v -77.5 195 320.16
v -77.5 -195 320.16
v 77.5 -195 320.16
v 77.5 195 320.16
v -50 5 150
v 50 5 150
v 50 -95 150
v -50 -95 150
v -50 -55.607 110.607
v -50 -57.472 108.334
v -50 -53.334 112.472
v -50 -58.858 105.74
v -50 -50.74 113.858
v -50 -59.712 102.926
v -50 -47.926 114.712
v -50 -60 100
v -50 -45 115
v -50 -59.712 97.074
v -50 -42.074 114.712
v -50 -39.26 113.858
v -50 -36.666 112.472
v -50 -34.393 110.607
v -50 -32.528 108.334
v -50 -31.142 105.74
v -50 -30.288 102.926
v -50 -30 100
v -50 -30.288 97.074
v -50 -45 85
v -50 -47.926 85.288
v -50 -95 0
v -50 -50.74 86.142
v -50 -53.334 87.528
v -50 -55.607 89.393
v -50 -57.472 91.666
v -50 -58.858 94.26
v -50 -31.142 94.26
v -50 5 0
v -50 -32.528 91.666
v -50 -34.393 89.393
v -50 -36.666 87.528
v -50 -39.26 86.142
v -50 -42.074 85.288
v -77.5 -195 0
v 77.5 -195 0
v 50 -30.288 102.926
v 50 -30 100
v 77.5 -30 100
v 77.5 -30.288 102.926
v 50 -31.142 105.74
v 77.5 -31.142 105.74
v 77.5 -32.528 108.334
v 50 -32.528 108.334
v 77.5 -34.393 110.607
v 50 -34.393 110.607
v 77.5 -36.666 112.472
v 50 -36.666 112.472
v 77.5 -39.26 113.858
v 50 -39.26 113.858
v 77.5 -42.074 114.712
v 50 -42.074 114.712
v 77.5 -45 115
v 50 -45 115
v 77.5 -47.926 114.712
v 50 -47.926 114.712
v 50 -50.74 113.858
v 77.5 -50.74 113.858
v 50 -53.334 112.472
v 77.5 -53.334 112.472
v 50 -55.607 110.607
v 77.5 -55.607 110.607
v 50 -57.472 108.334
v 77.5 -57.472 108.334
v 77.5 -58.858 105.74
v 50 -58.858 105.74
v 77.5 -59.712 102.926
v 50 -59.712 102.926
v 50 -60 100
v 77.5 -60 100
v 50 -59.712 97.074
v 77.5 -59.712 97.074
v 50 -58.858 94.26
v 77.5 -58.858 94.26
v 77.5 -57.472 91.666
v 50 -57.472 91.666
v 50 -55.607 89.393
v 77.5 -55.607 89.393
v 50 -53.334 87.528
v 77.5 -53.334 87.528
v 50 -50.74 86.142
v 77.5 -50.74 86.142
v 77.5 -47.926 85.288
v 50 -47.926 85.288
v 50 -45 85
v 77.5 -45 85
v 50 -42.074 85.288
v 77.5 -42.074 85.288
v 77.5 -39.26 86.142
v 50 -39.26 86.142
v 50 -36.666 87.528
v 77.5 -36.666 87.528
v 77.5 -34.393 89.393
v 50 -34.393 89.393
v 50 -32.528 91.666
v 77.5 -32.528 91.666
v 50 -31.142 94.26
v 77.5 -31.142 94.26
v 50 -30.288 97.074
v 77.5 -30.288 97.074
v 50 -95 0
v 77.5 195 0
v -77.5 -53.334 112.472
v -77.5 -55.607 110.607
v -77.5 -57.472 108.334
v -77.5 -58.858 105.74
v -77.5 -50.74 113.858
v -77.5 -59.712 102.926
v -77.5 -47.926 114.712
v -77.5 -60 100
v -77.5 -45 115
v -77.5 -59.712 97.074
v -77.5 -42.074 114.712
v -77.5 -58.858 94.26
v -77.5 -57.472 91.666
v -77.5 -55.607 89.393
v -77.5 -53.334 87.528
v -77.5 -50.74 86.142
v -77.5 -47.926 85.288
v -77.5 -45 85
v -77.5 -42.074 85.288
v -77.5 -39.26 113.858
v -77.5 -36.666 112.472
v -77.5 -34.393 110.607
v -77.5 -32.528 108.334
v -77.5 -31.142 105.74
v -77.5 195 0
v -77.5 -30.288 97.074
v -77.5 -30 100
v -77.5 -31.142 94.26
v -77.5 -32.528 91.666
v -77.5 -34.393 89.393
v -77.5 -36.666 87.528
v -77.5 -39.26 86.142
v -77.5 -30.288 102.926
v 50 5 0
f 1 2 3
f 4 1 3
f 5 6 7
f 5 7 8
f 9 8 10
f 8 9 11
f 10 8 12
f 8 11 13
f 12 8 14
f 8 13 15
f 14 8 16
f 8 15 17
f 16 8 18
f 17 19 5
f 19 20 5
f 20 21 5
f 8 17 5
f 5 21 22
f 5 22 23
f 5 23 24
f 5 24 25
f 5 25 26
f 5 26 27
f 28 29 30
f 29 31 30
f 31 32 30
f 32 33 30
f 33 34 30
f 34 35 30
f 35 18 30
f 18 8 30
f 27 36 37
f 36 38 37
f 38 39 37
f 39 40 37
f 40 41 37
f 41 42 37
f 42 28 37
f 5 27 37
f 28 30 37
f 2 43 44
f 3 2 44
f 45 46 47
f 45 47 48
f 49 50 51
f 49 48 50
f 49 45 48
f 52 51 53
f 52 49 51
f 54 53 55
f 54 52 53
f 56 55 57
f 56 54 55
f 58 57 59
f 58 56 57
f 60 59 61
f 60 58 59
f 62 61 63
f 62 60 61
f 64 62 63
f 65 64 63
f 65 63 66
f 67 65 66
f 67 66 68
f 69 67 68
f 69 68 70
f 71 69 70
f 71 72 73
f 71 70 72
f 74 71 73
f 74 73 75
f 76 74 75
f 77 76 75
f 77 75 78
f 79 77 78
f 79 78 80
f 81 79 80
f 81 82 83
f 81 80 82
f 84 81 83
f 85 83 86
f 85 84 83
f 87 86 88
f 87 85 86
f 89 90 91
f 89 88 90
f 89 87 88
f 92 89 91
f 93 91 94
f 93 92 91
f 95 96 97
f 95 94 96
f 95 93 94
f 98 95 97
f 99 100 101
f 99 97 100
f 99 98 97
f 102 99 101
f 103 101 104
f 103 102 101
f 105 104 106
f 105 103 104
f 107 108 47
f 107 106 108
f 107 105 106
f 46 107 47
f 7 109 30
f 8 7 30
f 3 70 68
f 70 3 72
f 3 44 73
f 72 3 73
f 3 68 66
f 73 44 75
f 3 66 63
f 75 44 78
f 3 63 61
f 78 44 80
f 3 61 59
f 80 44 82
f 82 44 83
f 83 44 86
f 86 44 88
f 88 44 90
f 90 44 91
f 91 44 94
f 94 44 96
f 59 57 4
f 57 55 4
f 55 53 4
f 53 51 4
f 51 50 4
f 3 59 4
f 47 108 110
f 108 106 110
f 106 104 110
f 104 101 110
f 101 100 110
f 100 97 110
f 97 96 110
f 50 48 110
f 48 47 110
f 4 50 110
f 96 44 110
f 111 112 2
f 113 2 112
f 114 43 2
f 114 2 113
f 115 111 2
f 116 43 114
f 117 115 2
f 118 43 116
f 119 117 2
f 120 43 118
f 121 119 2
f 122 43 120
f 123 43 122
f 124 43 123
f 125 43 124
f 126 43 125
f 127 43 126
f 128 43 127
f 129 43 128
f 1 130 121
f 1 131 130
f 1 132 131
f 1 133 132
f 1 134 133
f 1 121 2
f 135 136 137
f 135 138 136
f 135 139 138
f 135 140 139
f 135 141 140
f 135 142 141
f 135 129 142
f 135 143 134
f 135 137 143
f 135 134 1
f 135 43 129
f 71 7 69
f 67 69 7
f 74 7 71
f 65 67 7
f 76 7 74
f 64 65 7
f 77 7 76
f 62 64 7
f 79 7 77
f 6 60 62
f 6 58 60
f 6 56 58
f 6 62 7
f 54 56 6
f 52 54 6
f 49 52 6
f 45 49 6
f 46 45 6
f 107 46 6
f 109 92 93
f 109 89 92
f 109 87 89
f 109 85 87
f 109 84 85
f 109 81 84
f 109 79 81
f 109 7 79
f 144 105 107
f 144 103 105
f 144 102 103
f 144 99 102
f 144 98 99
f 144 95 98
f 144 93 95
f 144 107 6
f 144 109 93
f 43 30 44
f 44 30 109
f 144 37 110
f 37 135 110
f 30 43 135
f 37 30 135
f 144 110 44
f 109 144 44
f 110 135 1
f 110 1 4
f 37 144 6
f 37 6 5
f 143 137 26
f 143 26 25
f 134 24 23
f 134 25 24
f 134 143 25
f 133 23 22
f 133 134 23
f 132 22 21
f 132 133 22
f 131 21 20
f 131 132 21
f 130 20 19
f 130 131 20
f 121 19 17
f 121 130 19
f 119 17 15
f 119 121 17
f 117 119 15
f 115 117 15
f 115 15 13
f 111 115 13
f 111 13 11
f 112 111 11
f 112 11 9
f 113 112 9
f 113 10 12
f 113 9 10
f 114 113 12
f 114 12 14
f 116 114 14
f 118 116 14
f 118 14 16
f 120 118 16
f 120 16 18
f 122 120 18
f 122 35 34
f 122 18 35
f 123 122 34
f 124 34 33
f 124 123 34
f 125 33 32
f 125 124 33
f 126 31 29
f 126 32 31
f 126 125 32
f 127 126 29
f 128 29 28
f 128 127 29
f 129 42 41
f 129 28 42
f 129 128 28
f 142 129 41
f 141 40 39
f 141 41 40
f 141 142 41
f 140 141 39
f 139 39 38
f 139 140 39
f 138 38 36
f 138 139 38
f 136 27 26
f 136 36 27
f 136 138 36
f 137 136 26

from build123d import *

# Parameters (mm, degrees)
SKETCH1_W               = 155
SKETCH1_H               = 390
BOSS_EXTRUDE1_DEPTH     = 320.16
SKETCH2_W               = 100
SKETCH2_H               = 100
CUT_EXTRUDE1_DEPTH      = 150
CUT_EXTRUDE2_DEPTH      = 406.650620115
CUT_EXTRUDE2_DEPTH_BACK = 406.650620115
SKETCH3_R               = 15


with BuildPart() as part:
    # Sketch1 → Boss-Extrude1 (new body)
    with BuildSketch(Plane.XY):
        Rectangle(SKETCH1_W, SKETCH1_H)
    extrude(amount=BOSS_EXTRUDE1_DEPTH)

    # Sketch2 → Cut-Extrude1 (cut)
    with BuildSketch(Plane(origin=(0, 0, 0), x_dir=(-1, 0, 0), z_dir=(0, 0, -1))):
        with Locations((0, -45)):
            Rectangle(SKETCH2_W, SKETCH2_H)
    extrude(amount=-CUT_EXTRUDE1_DEPTH, mode=Mode.SUBTRACT)

    # Sketch3 → Cut-Extrude2 (cut, two sides: drawn at the far end of the back side and taken through both)
    with BuildSketch(Plane(origin=(77.5, 0, 0), x_dir=(0, 0, -1), z_dir=(1, 0, 0)).offset(-CUT_EXTRUDE2_DEPTH_BACK)):
        with Locations(Location((-100, -45, 0), (0, 0, 90))):
            Circle(SKETCH3_R)
    extrude(amount=CUT_EXTRUDE2_DEPTH + CUT_EXTRUDE2_DEPTH_BACK, mode=Mode.SUBTRACT)


solid = part.part
